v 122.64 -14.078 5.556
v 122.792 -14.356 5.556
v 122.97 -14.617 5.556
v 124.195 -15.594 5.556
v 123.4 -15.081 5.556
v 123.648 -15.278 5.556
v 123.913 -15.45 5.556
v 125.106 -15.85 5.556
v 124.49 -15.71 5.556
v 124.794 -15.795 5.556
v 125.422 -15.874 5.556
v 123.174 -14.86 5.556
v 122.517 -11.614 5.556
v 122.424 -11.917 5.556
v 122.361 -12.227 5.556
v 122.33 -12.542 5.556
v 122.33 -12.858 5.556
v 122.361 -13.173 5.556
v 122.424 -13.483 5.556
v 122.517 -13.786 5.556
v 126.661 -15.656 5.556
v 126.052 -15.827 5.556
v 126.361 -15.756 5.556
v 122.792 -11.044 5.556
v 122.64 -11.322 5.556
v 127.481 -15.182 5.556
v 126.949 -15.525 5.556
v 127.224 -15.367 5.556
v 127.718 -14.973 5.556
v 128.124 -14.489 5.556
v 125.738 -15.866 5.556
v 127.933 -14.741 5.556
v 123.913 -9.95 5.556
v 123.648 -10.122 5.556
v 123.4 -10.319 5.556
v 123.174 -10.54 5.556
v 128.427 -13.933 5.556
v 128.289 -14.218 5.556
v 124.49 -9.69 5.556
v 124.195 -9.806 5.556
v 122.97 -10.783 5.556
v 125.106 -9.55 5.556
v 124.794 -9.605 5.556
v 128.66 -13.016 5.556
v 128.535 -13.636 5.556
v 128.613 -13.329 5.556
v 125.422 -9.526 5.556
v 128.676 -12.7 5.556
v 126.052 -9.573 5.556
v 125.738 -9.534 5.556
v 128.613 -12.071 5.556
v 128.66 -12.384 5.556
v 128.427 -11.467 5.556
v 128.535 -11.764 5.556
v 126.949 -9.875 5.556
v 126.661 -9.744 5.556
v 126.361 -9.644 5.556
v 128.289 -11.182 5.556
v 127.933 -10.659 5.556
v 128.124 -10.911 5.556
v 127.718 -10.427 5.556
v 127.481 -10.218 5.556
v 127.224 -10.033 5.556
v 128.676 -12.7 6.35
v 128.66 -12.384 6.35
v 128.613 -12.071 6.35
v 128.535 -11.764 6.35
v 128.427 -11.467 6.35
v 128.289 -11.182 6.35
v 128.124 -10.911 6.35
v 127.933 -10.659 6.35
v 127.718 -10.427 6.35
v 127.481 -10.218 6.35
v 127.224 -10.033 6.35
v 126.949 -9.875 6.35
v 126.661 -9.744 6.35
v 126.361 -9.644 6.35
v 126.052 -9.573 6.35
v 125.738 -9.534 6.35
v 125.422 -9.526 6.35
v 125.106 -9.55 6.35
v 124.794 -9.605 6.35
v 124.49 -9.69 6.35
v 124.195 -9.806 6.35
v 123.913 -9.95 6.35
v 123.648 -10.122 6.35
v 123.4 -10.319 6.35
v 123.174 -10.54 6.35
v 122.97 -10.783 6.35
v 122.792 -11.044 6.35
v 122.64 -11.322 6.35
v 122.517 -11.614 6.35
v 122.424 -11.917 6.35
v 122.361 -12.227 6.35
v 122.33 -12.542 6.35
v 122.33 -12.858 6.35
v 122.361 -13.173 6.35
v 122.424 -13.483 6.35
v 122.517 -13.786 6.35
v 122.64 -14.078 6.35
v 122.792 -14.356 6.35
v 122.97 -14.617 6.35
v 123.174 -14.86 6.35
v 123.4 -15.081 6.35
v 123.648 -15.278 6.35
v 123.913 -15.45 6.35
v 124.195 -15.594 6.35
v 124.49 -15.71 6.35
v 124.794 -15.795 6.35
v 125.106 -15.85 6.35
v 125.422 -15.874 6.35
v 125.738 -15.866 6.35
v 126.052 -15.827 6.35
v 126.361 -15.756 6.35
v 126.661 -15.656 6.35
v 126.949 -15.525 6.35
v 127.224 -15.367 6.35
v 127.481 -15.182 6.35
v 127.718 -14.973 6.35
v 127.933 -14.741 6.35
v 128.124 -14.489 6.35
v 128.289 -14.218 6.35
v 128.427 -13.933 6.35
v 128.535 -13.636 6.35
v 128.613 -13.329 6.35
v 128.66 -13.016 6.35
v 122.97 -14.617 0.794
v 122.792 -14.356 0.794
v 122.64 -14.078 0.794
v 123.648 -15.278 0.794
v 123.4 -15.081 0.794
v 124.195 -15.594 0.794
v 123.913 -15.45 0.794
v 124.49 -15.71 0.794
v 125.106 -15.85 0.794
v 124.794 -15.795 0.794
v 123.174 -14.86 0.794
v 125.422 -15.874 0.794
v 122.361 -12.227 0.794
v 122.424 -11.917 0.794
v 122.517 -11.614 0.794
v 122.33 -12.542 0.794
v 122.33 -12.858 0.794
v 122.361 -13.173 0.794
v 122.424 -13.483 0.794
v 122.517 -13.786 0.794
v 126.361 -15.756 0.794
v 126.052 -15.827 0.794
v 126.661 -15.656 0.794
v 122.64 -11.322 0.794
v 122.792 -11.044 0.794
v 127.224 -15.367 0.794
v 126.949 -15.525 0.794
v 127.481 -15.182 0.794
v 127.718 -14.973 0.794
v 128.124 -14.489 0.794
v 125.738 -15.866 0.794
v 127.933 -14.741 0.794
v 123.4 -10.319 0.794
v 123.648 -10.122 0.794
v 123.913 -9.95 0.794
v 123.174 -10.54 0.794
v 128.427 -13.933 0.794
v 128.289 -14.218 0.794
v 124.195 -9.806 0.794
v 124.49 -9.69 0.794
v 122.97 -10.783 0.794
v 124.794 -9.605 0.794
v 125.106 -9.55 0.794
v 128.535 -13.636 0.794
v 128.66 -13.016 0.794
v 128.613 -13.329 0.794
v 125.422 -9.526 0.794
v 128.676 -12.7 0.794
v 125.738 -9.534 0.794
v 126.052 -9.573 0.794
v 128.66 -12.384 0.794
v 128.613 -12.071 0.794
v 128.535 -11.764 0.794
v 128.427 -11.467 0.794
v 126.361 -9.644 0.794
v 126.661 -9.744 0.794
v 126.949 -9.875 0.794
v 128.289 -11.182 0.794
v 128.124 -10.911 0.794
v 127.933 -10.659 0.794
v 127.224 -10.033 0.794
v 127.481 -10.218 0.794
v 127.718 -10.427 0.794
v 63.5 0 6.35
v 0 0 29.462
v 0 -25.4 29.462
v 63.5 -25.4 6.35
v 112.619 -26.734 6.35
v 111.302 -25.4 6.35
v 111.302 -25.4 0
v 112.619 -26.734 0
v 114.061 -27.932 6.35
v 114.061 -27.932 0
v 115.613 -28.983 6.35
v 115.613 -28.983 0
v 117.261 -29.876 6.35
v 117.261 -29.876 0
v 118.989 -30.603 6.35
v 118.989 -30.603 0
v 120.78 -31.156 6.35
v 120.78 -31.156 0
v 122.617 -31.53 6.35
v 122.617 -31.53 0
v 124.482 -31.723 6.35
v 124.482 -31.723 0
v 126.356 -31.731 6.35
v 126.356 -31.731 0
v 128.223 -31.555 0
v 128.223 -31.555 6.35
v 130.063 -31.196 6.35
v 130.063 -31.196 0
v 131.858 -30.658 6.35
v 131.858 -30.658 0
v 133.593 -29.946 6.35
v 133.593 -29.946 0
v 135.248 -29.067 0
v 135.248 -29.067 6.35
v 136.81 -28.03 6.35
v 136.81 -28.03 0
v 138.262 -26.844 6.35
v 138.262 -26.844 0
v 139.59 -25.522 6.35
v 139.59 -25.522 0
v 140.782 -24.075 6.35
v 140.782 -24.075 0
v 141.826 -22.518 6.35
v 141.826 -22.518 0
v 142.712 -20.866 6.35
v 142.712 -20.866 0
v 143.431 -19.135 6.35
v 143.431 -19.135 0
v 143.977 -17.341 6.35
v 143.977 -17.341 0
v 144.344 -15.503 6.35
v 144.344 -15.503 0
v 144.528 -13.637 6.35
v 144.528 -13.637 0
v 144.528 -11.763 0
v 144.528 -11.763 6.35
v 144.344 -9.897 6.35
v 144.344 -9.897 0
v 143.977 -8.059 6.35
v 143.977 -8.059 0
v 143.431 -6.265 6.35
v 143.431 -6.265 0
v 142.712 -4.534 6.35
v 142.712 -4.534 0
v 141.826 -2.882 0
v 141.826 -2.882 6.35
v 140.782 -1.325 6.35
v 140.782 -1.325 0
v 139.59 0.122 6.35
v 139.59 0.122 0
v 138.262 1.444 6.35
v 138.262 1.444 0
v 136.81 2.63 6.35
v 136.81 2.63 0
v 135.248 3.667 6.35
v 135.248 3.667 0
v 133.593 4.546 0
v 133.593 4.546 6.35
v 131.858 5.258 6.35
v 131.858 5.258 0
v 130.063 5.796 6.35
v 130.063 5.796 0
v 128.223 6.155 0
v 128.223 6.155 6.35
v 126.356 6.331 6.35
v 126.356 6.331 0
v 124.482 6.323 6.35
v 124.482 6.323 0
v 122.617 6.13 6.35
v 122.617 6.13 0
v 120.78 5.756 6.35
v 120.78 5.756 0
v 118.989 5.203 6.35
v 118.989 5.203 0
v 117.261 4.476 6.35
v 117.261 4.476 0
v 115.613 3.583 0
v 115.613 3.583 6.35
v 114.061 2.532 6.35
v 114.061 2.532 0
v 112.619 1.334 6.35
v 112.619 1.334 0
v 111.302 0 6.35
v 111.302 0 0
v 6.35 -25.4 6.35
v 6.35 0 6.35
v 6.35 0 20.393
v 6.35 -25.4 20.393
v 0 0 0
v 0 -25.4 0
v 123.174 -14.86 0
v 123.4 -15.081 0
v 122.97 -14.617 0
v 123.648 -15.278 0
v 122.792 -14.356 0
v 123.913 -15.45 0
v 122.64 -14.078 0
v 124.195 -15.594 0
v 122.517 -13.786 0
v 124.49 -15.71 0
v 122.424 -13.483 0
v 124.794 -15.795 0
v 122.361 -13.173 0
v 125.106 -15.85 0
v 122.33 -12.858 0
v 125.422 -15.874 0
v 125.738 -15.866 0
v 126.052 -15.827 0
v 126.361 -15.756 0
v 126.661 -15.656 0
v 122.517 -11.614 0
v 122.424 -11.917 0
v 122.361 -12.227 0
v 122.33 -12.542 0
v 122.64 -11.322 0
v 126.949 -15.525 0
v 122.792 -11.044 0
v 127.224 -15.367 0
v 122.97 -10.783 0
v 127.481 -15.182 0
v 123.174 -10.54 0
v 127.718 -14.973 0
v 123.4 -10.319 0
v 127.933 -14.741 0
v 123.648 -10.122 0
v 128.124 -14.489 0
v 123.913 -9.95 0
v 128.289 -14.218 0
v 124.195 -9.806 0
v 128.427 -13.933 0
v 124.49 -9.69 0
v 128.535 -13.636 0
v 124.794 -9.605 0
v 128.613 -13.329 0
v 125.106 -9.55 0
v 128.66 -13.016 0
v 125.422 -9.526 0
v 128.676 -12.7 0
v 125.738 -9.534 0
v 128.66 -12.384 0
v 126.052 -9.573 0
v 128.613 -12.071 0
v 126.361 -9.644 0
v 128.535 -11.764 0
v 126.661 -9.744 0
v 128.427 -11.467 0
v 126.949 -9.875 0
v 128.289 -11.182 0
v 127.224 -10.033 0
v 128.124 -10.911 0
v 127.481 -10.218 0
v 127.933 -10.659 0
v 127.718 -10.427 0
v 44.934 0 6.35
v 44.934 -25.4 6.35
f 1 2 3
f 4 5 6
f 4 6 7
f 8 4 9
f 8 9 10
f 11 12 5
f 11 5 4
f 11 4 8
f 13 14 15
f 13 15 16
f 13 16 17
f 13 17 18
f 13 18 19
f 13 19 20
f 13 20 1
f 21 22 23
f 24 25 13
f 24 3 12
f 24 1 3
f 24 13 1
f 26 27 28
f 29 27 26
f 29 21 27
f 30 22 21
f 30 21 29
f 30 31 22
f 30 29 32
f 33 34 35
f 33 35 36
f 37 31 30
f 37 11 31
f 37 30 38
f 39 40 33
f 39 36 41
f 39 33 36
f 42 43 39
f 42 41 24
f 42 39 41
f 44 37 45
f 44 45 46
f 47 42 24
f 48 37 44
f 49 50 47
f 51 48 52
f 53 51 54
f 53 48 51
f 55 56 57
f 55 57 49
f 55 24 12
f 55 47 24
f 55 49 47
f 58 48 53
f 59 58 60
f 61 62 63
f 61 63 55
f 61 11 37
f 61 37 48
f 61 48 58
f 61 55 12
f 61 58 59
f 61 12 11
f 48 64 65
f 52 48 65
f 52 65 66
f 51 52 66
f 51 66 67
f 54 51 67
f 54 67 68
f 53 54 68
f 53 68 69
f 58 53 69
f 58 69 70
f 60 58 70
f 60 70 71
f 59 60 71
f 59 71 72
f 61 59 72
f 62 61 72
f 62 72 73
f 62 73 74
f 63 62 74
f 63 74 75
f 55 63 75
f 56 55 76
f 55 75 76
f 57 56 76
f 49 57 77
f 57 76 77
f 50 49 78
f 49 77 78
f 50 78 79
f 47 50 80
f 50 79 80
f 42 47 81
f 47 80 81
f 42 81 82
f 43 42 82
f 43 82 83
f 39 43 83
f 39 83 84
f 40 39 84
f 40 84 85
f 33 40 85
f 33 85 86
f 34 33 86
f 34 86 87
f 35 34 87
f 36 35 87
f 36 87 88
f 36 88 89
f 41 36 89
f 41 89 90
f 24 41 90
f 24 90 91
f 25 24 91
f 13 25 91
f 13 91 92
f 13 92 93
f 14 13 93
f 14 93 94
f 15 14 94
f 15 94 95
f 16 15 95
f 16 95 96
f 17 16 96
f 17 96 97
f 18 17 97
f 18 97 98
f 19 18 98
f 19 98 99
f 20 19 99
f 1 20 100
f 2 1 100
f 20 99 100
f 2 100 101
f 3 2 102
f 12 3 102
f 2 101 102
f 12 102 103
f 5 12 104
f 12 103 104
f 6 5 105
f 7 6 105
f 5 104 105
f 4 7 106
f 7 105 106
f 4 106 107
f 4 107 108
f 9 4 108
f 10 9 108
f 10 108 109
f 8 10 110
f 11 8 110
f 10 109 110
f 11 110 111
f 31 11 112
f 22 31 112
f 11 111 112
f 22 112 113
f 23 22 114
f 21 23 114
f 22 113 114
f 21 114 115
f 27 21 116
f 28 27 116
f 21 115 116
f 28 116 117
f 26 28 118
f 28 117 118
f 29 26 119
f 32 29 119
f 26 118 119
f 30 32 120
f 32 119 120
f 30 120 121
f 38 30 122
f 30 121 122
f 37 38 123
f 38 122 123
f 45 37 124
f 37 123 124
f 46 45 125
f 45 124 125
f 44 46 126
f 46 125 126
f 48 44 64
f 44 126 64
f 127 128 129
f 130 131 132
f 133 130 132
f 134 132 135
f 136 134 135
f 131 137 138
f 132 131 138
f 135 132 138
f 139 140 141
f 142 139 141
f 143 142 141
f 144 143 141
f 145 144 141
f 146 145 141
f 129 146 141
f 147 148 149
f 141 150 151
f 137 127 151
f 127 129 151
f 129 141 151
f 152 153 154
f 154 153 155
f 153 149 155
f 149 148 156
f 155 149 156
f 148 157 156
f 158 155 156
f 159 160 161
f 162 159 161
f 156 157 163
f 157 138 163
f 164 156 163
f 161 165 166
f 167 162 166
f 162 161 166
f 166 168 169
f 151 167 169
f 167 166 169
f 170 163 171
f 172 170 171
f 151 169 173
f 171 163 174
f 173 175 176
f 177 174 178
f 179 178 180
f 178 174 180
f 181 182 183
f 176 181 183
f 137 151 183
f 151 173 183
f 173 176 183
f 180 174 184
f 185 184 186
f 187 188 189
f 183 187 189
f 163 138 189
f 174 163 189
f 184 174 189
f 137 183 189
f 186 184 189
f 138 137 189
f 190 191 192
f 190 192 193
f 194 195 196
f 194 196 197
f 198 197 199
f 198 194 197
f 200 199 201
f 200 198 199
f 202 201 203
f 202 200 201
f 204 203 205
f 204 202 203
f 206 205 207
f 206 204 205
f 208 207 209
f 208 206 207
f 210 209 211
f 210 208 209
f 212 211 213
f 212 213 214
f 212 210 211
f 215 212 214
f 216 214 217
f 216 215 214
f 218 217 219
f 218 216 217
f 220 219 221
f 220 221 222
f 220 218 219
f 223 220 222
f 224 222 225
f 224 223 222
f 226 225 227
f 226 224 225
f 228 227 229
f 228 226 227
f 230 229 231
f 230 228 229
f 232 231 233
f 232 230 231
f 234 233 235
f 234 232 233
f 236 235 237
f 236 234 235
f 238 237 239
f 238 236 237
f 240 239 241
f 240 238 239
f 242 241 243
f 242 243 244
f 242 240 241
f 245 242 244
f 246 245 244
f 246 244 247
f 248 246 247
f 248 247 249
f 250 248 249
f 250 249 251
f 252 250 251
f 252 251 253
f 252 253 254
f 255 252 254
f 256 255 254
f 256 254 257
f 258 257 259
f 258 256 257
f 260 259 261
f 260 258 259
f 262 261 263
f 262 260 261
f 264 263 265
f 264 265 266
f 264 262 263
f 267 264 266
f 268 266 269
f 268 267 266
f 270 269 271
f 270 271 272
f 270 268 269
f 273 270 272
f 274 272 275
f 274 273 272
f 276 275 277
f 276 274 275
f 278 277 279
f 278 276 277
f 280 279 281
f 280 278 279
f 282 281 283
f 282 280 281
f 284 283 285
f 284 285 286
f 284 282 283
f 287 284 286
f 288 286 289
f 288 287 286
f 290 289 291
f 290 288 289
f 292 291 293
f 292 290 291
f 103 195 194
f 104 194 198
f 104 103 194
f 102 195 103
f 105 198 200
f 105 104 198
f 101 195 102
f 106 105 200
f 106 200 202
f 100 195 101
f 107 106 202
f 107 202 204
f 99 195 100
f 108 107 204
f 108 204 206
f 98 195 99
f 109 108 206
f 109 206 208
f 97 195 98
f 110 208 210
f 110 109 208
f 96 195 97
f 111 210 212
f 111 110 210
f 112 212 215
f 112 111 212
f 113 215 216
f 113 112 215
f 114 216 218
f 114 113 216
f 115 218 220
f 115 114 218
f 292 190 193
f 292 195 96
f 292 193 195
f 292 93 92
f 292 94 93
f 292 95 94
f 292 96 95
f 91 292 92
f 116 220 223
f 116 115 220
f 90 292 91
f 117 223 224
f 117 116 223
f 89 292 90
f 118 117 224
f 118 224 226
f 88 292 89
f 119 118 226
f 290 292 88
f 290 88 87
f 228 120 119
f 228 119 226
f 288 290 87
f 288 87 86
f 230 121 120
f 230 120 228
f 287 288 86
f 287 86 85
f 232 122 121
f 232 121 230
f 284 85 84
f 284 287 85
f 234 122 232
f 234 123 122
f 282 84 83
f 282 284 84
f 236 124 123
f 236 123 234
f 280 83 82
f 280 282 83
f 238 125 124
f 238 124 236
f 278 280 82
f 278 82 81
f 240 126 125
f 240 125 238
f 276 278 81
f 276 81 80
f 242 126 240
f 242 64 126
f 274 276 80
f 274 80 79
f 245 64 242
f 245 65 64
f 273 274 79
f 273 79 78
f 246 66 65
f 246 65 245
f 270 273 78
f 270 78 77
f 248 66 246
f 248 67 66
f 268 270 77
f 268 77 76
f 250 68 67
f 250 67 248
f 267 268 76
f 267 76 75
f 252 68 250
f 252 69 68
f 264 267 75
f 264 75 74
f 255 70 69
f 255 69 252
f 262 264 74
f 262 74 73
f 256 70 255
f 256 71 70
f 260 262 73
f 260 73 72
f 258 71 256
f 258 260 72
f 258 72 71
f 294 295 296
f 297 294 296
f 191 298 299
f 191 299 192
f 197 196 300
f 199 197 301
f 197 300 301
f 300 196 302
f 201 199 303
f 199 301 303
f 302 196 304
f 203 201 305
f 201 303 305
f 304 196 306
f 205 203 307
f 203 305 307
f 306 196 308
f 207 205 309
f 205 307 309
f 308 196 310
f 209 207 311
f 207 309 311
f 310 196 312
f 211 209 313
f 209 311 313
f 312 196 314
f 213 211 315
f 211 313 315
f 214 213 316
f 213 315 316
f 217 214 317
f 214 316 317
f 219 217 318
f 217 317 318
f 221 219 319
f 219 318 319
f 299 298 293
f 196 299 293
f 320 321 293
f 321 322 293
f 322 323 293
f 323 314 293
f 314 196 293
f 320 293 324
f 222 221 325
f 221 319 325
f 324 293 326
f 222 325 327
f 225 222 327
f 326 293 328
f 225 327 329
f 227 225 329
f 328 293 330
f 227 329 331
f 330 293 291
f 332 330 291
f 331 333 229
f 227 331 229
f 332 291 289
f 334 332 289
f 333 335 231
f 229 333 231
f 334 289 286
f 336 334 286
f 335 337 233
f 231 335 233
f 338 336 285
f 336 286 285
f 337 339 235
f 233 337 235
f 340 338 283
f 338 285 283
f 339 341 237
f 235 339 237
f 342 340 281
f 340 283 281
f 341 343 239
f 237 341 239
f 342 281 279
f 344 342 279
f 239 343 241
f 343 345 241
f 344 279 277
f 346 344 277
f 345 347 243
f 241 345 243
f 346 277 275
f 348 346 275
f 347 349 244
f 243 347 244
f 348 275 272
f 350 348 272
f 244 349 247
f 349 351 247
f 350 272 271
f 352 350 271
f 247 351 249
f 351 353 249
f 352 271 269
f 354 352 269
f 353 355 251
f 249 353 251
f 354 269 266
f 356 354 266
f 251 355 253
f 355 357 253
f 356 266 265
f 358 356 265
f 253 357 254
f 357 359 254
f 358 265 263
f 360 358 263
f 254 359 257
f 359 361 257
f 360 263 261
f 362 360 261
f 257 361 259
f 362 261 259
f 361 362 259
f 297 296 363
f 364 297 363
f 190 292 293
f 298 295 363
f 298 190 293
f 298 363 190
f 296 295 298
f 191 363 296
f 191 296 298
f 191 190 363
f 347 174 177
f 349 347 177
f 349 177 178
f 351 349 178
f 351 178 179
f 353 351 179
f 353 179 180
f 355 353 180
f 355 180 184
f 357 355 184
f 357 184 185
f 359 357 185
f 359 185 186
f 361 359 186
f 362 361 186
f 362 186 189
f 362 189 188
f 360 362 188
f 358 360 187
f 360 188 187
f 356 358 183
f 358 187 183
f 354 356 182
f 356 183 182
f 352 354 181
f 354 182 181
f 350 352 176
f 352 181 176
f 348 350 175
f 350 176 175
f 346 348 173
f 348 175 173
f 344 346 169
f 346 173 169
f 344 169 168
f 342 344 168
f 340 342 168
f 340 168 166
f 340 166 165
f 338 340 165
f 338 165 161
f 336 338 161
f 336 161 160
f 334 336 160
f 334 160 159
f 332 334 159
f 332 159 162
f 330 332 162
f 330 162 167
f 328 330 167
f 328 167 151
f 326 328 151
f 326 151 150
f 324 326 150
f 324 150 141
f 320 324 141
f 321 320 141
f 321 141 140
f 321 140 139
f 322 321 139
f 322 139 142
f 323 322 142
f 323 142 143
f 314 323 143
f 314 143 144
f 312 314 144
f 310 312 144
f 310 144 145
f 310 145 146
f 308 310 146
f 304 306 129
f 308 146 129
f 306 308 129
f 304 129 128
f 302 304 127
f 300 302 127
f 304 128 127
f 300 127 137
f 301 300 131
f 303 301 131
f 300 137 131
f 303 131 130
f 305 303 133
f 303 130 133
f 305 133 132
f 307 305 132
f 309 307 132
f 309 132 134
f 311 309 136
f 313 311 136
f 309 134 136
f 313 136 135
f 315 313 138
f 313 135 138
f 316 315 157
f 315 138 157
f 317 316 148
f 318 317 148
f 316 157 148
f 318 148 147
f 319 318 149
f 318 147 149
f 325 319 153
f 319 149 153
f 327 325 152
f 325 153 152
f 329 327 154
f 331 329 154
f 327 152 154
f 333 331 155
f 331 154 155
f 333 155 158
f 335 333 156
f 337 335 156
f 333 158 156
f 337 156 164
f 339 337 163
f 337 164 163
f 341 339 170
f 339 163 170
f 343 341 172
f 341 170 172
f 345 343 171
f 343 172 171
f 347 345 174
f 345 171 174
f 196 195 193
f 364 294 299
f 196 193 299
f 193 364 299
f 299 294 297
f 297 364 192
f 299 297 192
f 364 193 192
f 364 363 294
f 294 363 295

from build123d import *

# Parameters (mm, degrees)
BOSS_EXTRUDE1_DEPTH   = 25.4
SKETCH3_R             = 19.05
SKETCH3_R_2           = 3.175
BOSS_EXTRUDE2_DEPTH   = 6.35
CUT_EXTRUDE1_DEPTH    = 25.4
BOSS_EXTRUDE3_START   = -0.79375
BOSS_EXTRUDE3_DEPTH   = 4.7625
BODY_MOVE_COPY1_ANGLE = 90


with BuildPart() as part:
    # Sketch2 → Boss-Extrude1 (new body)
    with BuildSketch(Plane.XY):
        Polygon((0, 0), (0, 29.462109876), (63.5, 6.35), (139.7, 6.35), (139.7, 0), align=None)
        Polygon((44.933842059, 6.35), (6.35, 6.35), (6.35, 20.393370033), align=None, mode=Mode.SUBTRACT)
    extrude(amount=BOSS_EXTRUDE1_DEPTH)

    # Sketch3 → Boss-Extrude2 (add)
    with BuildSketch(Plane(origin=(0, 6.35, 0), x_dir=(1, 0, 0), z_dir=(0, 1, 0))):
        with Locations((125.500968343, -12.7)):
            Circle(SKETCH3_R)
        with Locations((125.500968343, -12.7)):
            Circle(SKETCH3_R_2, mode=Mode.SUBTRACT)
    extrude(amount=-BOSS_EXTRUDE2_DEPTH)

    # Sketch3<2> → Cut-Extrude1 (cut)
    with BuildSketch(Plane(origin=(0, 6.35, 0), x_dir=(1, 0, 0), z_dir=(0, 1, 0))):
        with BuildLine():
            ThreePointArc((122.325968343, -12.7), (125.500968343, -15.875), (128.675968343, -12.7))
            Line((128.675968343, -12.7), (122.325968343, -12.7))
        make_face()
        with BuildLine():
            Line((122.325968343, -12.7), (128.675968343, -12.7))
            ThreePointArc((128.675968343, -12.7), (125.500968343, -9.525), (122.325968343, -12.7))
        make_face()
    extrude(amount=-CUT_EXTRUDE1_DEPTH, mode=Mode.SUBTRACT)

    # Sketch3<3> → Boss-Extrude3 (add)
    with BuildSketch(Plane(origin=(0, 6.35, 0), x_dir=(1, 0, 0), z_dir=(0, 1, 0)).offset(BOSS_EXTRUDE3_START)):
        with BuildLine():
            ThreePointArc((122.325968343, -12.7), (125.500968343, -15.875), (128.675968343, -12.7))
            Line((128.675968343, -12.7), (122.325968343, -12.7))
        make_face()
        with BuildLine():
            Line((122.325968343, -12.7), (128.675968343, -12.7))
            ThreePointArc((128.675968343, -12.7), (125.500968343, -9.525), (122.325968343, -12.7))
        make_face()
    extrude(amount=-BOSS_EXTRUDE3_DEPTH)


with BuildPart() as part_1:
    # Body-Move/Copy1: moved
    add(part.part.rotate(Axis((0, 0, 0), (1, 0, 0)), BODY_MOVE_COPY1_ANGLE))


solid = part_1.part
